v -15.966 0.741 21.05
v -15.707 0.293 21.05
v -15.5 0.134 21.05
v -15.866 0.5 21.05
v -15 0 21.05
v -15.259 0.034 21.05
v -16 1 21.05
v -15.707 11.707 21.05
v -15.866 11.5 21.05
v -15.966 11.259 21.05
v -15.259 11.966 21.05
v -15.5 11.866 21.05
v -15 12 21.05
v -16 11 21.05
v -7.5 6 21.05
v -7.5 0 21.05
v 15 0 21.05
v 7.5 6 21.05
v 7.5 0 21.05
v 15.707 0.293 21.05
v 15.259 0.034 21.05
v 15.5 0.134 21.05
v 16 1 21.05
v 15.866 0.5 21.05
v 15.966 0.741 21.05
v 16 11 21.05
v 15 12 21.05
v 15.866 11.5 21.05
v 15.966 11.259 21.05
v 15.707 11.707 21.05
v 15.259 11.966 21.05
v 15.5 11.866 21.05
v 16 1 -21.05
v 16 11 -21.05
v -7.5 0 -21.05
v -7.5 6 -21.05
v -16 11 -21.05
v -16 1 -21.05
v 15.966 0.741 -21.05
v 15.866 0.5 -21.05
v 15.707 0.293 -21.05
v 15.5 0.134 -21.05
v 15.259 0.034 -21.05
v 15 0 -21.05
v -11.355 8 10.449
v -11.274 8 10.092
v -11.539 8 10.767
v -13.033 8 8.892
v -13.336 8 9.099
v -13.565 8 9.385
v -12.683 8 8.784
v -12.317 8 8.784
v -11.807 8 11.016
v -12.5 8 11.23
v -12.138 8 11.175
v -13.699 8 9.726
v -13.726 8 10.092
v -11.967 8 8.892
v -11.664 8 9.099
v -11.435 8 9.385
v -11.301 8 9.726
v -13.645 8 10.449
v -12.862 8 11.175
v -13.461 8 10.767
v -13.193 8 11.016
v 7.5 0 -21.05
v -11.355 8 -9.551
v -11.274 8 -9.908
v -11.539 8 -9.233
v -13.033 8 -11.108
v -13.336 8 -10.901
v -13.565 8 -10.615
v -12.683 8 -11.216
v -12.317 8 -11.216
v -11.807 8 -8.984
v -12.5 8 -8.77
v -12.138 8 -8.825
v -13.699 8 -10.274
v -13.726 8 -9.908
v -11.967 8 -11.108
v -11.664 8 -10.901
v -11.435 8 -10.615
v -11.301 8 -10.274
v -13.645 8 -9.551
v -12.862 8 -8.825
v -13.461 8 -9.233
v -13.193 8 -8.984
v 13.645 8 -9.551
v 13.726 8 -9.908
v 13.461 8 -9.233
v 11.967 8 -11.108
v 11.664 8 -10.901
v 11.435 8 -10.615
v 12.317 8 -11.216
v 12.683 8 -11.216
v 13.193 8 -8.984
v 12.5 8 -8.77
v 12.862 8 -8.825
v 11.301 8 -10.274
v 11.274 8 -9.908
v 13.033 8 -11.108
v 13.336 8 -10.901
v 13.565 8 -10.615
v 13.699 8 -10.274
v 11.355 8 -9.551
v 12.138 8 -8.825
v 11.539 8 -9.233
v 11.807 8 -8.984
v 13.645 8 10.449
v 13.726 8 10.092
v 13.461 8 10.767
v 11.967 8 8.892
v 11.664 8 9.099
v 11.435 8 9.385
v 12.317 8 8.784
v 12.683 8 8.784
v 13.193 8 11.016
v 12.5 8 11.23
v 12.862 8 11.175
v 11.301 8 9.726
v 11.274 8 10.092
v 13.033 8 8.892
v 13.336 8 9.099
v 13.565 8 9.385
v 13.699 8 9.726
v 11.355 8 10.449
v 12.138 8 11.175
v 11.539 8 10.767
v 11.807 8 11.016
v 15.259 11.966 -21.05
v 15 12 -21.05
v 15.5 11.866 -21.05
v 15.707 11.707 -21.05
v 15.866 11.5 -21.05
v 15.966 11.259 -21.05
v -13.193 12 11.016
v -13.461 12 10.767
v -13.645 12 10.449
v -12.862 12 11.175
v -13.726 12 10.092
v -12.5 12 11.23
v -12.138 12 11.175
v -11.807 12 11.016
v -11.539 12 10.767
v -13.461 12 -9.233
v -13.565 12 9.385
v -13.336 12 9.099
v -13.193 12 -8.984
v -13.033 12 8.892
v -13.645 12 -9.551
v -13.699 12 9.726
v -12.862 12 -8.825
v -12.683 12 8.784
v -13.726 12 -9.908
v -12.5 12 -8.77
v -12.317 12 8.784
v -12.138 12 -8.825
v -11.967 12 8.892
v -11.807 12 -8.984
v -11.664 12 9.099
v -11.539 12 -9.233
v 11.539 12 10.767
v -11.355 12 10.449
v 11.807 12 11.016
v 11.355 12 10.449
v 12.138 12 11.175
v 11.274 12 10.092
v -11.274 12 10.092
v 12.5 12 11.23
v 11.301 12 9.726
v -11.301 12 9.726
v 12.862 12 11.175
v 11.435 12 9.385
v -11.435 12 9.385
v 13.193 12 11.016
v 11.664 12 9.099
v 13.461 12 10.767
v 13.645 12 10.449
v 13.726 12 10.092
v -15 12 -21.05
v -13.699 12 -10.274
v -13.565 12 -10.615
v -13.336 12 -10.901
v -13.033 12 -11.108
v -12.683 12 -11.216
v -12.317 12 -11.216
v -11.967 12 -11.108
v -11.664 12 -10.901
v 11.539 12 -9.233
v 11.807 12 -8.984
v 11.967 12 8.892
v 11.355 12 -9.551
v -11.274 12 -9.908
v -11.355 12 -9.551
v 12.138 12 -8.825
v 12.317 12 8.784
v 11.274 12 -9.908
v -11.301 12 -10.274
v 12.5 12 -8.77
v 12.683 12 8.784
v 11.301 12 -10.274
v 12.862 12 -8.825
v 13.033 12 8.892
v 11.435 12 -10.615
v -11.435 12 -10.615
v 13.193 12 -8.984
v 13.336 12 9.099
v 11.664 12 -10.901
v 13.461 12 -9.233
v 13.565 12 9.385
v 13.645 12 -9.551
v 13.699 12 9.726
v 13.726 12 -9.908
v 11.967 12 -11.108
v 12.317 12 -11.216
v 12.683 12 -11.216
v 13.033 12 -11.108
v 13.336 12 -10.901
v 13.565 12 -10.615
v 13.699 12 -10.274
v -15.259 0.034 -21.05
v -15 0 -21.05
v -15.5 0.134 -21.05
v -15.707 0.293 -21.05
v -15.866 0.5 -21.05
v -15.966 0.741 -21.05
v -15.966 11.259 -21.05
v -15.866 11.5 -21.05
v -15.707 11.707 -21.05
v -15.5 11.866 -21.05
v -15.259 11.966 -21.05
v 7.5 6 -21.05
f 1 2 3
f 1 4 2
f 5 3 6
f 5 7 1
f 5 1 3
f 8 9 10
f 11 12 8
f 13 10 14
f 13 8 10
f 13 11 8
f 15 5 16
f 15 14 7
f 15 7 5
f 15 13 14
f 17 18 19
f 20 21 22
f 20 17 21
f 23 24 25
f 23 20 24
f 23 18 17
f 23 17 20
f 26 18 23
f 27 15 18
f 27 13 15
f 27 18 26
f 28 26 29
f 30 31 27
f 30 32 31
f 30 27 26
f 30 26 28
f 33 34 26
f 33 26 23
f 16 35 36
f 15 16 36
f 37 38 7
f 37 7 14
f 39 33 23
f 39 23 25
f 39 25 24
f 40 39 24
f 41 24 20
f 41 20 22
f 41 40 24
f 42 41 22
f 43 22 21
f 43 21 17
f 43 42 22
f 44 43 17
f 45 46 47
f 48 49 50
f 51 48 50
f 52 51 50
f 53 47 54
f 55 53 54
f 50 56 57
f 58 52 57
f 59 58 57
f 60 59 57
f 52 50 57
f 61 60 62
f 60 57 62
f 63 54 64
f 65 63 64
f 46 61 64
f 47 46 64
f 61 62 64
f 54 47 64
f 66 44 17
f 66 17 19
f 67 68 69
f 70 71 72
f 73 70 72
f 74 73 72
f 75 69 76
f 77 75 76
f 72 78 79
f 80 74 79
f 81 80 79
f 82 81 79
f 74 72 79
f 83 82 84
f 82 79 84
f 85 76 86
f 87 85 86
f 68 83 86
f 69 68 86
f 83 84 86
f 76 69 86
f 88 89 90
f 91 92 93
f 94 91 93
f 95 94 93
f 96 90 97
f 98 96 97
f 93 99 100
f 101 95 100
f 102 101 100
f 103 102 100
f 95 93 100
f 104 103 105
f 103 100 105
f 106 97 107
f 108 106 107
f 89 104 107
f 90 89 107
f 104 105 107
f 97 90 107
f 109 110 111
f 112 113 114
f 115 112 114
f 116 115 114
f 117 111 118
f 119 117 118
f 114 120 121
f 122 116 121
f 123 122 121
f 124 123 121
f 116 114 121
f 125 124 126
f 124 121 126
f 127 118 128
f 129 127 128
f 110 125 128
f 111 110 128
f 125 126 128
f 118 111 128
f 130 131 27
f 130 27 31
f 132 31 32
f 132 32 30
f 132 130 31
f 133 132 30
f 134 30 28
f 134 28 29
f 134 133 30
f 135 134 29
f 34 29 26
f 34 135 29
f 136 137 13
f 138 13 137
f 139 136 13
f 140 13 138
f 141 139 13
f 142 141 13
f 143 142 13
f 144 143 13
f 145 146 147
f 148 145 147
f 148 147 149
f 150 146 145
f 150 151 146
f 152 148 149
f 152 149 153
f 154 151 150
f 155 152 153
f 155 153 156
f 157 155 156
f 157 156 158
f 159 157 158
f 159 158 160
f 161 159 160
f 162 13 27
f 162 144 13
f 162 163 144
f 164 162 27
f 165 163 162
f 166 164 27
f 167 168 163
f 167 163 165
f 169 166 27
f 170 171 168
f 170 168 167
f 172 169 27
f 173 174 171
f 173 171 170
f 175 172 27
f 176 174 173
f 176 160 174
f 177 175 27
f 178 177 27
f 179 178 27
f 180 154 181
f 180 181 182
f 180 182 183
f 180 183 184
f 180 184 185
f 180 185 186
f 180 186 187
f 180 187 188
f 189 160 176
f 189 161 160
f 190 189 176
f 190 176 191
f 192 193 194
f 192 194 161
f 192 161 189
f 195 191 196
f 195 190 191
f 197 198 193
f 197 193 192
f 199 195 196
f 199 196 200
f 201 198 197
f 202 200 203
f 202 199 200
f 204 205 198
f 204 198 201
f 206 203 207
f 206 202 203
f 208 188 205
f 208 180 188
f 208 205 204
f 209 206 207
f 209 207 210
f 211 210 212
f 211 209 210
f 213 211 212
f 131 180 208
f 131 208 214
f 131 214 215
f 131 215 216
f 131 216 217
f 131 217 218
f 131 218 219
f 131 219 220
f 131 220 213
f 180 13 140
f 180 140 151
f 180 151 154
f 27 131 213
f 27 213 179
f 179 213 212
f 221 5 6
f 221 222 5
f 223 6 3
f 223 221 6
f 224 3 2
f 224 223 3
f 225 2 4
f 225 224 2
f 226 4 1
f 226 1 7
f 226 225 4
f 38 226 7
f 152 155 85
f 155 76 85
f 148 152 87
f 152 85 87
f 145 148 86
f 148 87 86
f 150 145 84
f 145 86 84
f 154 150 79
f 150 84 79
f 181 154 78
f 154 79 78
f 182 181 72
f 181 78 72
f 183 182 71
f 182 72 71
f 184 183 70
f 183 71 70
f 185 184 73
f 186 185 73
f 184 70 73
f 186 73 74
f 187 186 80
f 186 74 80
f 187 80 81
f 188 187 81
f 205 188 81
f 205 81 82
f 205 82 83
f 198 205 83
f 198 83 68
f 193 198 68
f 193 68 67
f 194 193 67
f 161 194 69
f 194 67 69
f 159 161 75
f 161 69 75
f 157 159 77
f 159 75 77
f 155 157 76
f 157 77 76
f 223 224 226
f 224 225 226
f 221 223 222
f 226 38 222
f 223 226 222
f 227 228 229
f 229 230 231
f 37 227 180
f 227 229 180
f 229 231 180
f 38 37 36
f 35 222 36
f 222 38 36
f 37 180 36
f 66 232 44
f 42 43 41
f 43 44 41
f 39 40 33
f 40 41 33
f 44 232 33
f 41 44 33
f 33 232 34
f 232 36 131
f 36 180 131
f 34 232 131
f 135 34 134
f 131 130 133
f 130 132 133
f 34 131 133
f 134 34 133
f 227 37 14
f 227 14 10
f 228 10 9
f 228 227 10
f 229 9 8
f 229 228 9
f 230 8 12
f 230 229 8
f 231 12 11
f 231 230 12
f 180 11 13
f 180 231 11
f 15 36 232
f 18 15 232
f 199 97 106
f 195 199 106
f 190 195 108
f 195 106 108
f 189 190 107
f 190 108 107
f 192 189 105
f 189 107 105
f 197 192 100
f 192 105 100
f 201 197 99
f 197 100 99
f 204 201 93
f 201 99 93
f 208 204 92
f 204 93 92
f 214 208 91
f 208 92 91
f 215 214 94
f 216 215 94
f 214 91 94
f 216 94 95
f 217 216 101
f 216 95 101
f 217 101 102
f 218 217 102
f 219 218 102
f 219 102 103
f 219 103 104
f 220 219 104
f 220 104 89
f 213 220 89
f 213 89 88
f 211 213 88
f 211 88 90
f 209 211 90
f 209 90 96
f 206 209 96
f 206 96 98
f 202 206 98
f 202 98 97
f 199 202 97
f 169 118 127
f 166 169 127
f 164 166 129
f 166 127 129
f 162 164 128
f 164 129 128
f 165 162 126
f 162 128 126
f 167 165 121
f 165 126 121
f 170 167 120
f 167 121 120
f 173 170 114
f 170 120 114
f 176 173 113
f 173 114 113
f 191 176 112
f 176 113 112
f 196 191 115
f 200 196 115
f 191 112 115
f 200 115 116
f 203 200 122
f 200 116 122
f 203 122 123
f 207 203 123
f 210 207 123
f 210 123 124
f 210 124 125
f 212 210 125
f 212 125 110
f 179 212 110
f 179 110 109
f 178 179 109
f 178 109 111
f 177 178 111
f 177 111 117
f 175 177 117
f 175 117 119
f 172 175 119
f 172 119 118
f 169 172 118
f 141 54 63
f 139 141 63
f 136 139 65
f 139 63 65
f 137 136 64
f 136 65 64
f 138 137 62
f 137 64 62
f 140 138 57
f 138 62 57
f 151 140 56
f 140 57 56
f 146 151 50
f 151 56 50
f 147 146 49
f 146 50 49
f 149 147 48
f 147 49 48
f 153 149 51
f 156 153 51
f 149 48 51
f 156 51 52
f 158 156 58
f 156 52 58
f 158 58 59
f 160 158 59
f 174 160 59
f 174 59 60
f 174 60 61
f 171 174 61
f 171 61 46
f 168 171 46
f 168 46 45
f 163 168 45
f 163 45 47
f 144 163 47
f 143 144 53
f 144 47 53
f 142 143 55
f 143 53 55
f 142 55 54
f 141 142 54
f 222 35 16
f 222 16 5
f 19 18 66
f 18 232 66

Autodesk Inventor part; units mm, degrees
ref_plane "YZ Plane" through (0, 0, 0) normal (1, 0, 0) x (0, 1, 0)
ref_plane "XZ Plane" through (0, 0, 0) normal (0, 1, 0) x (-1, 0, 0)
ref_plane "XY Plane" through (0, 0, 0) normal (0, 0, 1) x (1, 0, 0)
sketch "Sketch1" plane through (0, 0, 0) normal (0, 0, 1) x (1, 0, 0)
  line L0 (-7.5, 6) -> (7.5, 6)
  line L1 (7.5, 6) -> (7.5, 0)
  line L2 (7.5, 0) -> (-7.5, 0)
  line L3 (-7.5, 0) -> (-7.5, 6)
  line L4 (-7.5, 6) -> (7.5, 0) construction
  line L5 (7.5, 6) -> (-7.5, 0) construction
  line L6 (-16, 12) -> (16, 12)
  line L7 (16, 12) -> (16, 0)
  line L8 (16, 0) -> (-16, 0)
  line L9 (-16, 0) -> (-16, 12)
  line L10 (-16, 12) -> (16, 0) construction
  line L11 (16, 12) -> (-16, 0) construction
  point P0 (0, 0)
  point P1 (0, 3)
  point P2 (0, 0)
  point P3 (0, 6)
  point P4 (7.5, 0)
  point P5 (-7.5, 0)
  dimension "d0" = 15
  dimension "d1" = 6
  dimension "d2" = 32
  dimension "d3" = 12
extrude "Extrusion1" add sketch "Sketch1" along normal mid plane 42.1 contours L3 L8 L9 L6 L7 L1 L0
sketch "Sketch2" plane through (-16, 12, 21.05) normal (0, 1, 0) x (1, 0, 0)
  line L0 (28.5, 11.05) -> (3.5, 11.05) construction
  line L1 (3.5, 11.05) -> (3.5, 31.05) construction
  line L2 (3.5, 31.05) -> (28.5, 31.05) construction
  line L3 (28.5, 31.05) -> (28.5, 11.05) construction
  line L4 (28.5, 11.05) -> (3.5, 31.05) construction
  line L5 (3.5, 11.05) -> (28.5, 31.05) construction
  point P0 (16, 21.05)
  dimension "d6" = 25
  dimension "d7" = 20
hole "Hole1" at (-12.5, 12, 10) at (12.5, 12, 10) at (12.5, 12, -10) at (-12.5, 12, -10) direction (0, -1, 0) diameter 2.459 depth 4 thread size "M3x0.5" class "6H" standard "ISO Metric profile"
fillet "Fillet1" radius 1 4 edges at (16, 12, 0) (-16, 12, 0) (16, 0, 0) (-16, 0, 0)
properties part number "MGN12C Cart" material "Steel, Carbon"
